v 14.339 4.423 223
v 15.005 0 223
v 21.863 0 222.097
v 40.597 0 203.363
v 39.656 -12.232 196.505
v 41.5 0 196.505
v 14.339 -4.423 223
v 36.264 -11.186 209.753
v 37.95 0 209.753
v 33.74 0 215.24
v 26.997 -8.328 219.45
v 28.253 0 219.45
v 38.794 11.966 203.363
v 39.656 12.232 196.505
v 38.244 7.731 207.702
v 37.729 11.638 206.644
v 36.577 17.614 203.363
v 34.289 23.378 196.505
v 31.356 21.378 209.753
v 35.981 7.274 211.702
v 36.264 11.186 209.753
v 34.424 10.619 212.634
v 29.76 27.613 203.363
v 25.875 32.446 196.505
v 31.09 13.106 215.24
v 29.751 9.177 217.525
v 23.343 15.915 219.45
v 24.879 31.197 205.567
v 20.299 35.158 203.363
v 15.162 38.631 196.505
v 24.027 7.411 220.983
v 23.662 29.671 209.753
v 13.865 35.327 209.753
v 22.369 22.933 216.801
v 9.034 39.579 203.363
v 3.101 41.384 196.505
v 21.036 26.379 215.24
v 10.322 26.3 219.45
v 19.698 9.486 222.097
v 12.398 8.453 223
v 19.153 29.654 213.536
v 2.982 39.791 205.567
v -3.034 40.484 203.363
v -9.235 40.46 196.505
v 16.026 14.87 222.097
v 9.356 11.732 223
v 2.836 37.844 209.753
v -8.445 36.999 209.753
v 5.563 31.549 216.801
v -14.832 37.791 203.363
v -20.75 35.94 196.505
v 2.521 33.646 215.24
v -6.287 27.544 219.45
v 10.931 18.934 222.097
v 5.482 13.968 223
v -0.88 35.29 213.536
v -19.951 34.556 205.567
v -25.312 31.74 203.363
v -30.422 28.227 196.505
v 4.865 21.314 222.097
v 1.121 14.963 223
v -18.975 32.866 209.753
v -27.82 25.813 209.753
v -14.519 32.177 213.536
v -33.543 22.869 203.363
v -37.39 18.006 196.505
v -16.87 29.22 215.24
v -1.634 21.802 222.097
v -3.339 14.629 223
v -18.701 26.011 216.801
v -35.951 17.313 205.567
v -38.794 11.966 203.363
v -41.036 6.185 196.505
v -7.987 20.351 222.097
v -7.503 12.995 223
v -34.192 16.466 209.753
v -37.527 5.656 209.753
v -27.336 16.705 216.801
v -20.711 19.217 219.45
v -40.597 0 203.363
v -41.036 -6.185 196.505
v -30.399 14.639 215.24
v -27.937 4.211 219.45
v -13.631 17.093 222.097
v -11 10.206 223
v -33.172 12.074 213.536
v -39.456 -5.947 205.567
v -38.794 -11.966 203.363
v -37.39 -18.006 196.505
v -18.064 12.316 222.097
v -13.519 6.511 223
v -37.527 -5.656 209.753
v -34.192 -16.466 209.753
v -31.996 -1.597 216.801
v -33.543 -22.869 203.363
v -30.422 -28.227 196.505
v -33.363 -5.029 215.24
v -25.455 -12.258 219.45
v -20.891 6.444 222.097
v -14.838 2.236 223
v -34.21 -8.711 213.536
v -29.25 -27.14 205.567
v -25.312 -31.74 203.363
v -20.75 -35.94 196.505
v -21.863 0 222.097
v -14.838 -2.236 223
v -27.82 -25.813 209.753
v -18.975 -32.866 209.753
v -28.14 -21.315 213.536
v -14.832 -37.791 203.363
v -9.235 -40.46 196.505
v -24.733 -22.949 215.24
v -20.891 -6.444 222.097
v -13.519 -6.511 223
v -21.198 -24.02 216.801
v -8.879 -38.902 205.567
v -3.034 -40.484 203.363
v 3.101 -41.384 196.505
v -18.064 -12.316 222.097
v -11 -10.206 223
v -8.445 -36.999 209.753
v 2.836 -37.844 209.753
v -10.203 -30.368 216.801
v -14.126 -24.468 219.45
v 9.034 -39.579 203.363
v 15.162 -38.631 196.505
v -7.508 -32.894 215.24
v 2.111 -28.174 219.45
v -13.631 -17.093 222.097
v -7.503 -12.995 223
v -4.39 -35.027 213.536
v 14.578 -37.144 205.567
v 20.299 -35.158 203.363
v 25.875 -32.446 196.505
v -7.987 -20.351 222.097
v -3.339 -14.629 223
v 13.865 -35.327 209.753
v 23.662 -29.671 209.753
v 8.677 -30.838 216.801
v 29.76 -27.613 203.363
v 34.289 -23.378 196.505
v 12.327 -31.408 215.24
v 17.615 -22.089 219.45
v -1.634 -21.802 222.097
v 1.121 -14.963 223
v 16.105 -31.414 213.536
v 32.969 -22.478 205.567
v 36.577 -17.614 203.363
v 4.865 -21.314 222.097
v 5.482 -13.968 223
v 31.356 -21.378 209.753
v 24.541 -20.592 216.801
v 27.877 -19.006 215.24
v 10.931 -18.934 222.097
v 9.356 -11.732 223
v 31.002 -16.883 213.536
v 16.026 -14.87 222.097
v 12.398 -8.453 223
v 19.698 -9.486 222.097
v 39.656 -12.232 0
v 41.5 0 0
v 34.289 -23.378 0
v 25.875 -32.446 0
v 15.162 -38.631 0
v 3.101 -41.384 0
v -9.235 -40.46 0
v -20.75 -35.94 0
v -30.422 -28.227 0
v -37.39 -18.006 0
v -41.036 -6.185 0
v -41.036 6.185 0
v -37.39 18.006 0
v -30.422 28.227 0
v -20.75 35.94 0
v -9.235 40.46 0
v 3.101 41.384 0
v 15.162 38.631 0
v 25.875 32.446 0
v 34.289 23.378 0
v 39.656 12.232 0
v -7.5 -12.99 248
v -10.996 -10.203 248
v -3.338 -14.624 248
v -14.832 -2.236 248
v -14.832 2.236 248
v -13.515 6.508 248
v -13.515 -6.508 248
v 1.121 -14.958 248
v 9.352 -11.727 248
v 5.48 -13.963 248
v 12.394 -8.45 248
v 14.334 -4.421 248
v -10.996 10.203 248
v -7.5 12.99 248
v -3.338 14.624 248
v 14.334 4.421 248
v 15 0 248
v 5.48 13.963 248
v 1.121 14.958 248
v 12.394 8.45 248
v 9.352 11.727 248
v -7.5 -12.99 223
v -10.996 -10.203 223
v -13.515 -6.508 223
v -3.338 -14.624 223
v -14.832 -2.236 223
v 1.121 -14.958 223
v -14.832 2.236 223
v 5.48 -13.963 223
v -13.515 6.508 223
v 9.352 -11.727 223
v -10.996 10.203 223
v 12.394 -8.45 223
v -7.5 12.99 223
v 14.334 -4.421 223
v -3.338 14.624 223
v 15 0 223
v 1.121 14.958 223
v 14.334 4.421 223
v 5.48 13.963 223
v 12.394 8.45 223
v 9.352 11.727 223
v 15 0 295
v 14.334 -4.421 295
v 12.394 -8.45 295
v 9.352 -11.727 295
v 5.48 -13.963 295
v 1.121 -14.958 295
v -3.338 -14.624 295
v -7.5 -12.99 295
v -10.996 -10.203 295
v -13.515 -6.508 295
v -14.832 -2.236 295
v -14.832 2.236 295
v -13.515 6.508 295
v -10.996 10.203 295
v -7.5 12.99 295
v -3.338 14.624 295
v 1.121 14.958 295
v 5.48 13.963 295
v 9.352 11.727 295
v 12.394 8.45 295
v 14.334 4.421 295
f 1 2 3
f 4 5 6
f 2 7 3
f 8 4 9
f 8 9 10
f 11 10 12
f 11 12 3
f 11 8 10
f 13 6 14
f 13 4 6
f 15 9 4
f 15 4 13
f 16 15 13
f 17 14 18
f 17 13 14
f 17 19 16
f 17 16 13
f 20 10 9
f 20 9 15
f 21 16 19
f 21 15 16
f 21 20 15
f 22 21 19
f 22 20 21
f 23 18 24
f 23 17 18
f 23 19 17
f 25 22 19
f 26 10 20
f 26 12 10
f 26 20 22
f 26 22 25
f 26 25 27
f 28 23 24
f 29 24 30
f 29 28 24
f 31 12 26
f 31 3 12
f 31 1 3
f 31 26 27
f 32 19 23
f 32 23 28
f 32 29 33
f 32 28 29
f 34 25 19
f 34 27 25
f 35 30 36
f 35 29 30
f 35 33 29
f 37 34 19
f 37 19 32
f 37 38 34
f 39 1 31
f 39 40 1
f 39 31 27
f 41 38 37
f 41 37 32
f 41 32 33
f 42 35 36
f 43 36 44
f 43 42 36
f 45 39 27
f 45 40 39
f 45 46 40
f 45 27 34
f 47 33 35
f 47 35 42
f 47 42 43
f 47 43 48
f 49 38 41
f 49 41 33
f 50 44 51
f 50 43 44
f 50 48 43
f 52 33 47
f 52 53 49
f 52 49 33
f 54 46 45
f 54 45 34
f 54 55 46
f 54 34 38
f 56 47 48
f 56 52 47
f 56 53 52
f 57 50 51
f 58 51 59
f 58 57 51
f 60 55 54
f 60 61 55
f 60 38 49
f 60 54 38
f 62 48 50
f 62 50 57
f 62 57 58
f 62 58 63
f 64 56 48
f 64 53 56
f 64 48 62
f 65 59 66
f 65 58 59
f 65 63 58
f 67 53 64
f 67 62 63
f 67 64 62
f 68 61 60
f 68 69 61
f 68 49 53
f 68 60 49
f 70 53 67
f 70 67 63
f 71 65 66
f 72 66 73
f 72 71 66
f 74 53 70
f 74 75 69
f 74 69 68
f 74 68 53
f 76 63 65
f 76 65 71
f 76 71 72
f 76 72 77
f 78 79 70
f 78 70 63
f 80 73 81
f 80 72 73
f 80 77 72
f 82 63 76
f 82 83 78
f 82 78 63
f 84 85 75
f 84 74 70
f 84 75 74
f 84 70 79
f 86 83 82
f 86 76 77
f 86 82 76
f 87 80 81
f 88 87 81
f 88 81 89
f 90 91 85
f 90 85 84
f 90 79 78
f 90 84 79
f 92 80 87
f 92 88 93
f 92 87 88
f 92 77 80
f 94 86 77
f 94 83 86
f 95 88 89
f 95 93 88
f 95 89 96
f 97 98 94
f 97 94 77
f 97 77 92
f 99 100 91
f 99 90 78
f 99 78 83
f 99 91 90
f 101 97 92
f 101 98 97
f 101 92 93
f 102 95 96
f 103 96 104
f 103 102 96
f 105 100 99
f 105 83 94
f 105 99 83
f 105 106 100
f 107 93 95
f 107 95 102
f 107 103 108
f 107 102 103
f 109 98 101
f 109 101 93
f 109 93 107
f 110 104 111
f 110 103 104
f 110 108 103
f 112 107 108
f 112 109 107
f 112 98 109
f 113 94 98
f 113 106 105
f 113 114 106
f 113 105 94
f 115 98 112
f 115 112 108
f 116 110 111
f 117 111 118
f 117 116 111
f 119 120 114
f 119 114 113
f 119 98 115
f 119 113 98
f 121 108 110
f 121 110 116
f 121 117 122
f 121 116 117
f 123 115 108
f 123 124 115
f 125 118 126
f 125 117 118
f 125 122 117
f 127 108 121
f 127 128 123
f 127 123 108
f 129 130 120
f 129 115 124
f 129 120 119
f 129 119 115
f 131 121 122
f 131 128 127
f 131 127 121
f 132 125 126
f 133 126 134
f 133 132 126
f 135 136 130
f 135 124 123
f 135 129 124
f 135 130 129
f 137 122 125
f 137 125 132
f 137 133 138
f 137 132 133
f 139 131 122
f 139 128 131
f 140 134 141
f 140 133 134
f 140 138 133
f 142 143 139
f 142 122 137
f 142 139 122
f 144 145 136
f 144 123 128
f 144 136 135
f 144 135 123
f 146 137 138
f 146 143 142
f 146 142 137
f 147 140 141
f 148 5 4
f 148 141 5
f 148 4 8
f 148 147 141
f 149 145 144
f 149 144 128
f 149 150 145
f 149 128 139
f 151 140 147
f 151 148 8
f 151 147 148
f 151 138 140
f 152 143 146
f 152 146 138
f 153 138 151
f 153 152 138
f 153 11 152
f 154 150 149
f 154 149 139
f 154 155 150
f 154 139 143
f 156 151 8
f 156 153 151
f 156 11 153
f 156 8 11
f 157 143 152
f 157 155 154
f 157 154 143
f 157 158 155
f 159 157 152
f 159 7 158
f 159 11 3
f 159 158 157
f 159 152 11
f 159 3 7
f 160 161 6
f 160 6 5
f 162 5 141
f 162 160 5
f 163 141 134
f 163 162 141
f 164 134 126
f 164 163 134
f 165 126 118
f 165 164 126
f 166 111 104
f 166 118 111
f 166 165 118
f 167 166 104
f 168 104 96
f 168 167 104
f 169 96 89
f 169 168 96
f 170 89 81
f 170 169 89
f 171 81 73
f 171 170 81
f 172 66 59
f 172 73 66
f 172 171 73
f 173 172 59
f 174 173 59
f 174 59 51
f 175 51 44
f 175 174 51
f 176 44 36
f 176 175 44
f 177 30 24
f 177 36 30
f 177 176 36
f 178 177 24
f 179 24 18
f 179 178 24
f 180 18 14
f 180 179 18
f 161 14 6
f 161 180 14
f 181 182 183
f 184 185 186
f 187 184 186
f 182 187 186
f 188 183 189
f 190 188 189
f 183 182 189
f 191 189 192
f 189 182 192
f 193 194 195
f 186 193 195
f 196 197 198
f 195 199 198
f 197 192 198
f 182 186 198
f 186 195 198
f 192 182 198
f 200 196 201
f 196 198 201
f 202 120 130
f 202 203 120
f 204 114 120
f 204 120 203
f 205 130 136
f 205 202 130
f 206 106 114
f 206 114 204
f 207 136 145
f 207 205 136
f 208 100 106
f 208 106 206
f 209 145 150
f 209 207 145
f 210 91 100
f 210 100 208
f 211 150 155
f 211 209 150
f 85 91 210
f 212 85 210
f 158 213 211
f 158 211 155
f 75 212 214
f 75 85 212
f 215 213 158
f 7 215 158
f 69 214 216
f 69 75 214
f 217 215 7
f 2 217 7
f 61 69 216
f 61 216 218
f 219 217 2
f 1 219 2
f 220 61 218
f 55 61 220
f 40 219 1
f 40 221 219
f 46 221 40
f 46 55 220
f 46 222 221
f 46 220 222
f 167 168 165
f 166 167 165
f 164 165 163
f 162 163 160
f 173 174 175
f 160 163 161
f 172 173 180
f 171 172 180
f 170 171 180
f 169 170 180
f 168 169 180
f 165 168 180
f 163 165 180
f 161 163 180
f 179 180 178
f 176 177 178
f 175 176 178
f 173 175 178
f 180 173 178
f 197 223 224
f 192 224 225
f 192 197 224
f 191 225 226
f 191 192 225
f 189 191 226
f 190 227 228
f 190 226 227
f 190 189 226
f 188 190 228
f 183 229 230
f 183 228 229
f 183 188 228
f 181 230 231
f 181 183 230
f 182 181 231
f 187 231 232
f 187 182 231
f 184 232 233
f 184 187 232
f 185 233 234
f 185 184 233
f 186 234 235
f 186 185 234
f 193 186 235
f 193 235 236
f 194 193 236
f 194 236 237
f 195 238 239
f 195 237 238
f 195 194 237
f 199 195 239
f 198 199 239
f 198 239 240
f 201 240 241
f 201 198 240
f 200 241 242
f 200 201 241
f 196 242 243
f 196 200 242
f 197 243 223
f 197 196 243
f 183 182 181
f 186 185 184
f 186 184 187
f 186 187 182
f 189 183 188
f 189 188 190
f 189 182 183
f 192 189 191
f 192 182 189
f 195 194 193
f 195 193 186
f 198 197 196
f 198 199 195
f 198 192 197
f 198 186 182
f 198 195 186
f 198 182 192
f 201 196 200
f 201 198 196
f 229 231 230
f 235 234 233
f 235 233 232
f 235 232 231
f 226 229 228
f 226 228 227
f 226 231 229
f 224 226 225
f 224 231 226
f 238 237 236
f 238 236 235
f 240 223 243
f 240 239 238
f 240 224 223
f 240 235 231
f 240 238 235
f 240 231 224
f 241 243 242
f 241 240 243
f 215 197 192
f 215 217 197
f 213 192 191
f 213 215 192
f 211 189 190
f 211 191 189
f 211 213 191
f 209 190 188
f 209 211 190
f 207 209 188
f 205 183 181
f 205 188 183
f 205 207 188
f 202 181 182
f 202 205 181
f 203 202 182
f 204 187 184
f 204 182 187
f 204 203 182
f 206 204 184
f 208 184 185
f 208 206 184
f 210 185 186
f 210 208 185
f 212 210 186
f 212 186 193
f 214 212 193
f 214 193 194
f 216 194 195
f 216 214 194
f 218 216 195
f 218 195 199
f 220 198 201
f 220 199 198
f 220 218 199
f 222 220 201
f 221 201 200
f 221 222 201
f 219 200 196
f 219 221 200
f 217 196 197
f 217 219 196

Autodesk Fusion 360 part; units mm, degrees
sketch "Sketch1" plane through (0, 0, 0) normal (0, 0, 1) x (1, 0, 0)
  circle A0 centre (0, 0) radius 41.5
  dimension "d1" = 83
extrude "Extrude1" add sketch "Sketch1" along normal blind 223 makes body 1
sketch "Sketch2" plane through (0, 0, 223) normal (0, 0, 1) x (1, 0, 0)
  circle A0 centre (0, 0) radius 41.5
  circle A1 centre (0, 0) radius 15
  circle A2 centre (0, 0) radius 15
  dimension "d4" = 30
extrude "Extrude2" add sketch "Sketch2" along normal blind 25 contours A1 A2 bodies 1
fillet "Fillet1" radius 26.5 1 edges at (-38.6916, -15.007, 223) on bodies 1
sketch "Sketch3" plane through (0, 0, 248) normal (0, 0, 1) x (1, 0, 0)
  circle A0 centre (0, 0) radius 15
  circle A1 centre (0, 0) radius 15
extrude "Extrude3" add sketch "Sketch3" along normal blind 47 separate body makes body 2
